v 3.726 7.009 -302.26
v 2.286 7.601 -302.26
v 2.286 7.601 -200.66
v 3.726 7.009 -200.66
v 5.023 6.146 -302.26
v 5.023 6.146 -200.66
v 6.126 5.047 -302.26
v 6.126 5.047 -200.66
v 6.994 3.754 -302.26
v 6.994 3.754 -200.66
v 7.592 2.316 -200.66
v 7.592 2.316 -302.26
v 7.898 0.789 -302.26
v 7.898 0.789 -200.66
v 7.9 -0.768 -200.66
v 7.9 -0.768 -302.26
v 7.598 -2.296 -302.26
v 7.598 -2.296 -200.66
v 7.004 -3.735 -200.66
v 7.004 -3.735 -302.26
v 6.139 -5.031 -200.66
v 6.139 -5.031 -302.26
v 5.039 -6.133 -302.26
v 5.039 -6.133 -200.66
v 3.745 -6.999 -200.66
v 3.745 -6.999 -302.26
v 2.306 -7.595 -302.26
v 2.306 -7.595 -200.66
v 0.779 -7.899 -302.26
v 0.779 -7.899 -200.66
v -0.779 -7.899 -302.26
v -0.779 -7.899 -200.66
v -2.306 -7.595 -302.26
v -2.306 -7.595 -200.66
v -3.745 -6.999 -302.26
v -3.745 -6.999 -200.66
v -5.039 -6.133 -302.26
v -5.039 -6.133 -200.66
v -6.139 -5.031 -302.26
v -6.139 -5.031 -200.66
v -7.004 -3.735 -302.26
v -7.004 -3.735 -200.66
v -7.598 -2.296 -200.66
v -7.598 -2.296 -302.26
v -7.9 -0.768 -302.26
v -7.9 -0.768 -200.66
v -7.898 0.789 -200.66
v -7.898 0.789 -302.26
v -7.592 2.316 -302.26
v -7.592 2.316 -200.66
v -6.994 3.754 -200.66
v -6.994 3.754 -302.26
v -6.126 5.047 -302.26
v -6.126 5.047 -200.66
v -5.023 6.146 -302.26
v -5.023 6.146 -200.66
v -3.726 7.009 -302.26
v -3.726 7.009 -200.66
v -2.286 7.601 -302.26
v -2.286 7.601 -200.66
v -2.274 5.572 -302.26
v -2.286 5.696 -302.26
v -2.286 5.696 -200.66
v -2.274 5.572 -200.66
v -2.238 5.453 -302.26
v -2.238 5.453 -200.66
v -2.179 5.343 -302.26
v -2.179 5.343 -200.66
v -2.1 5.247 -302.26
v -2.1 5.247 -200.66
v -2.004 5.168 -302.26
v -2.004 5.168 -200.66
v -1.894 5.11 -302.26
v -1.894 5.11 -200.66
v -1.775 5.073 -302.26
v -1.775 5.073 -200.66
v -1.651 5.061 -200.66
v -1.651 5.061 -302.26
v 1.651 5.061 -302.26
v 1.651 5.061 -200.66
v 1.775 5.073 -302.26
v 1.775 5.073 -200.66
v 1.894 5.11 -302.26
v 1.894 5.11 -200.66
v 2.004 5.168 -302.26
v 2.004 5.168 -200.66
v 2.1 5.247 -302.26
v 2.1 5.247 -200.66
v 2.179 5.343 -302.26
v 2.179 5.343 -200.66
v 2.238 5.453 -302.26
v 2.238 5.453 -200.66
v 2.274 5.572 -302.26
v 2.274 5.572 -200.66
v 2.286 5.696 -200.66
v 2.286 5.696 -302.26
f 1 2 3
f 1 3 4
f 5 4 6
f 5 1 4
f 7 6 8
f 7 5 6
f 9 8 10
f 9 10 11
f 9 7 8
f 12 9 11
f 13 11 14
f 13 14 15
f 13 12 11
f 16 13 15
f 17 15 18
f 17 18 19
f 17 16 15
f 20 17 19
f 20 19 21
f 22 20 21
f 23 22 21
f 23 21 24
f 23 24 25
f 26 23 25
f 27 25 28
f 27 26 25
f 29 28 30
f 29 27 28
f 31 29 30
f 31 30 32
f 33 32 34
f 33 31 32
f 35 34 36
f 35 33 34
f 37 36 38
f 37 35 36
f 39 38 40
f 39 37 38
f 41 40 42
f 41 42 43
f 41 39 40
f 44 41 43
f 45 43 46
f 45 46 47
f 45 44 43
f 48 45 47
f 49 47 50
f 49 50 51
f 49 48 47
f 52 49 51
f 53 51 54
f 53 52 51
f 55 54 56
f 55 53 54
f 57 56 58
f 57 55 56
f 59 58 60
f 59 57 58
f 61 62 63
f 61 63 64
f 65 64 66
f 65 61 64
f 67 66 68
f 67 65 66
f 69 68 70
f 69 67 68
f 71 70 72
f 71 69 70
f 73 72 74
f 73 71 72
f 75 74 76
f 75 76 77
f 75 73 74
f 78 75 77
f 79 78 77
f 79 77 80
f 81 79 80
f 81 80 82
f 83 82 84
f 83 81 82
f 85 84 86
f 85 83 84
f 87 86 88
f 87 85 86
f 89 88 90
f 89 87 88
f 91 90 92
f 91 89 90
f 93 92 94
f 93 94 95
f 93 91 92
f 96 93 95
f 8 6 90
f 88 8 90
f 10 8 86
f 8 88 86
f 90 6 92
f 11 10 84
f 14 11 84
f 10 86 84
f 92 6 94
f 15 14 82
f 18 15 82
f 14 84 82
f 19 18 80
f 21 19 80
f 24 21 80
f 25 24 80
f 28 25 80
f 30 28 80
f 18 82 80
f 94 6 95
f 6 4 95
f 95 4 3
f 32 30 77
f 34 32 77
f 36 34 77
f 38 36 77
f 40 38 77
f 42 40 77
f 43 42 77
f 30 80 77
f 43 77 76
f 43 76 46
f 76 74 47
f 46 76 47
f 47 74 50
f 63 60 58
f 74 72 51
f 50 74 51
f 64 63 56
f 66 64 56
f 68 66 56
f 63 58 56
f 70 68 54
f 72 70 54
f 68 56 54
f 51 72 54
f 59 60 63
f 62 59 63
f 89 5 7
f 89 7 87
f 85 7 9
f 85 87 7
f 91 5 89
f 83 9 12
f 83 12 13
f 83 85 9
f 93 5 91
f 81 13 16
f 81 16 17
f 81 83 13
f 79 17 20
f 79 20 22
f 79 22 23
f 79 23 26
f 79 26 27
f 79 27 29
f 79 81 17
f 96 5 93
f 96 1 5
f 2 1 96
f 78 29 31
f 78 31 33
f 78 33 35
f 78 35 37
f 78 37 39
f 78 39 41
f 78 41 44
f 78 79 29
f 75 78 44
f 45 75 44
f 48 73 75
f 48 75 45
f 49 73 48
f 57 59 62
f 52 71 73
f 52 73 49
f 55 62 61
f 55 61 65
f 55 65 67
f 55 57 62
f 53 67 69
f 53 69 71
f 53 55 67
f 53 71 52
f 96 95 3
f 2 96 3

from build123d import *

# Parameters (mm, degrees)
BOSS_EXTRUDE1_DEPTH = 101.6


with BuildPart() as part:
    # Sketch1 → Boss-Extrude1 (new body)
    with BuildSketch(Plane(origin=(0, 0, -302.26), x_dir=(-1, 0, 0), z_dir=(0, 0, -1))):
        with BuildLine():
            Line((2.286, 7.60119137), (2.286, 5.69619137))
            ThreePointArc((2.286, 5.69619137), (2.100012806, 5.247178564), (1.651, 5.06119137))
            Line((1.651, 5.06119137), (-1.651, 5.06119137))
            ThreePointArc((-1.651, 5.06119137), (-2.100012806, 5.247178564), (-2.286, 5.69619137))
            Line((-2.286, 5.69619137), (-2.286, 7.60119137))
            ThreePointArc((-2.286, 7.60119137), (0, -7.9375), (2.286, 7.60119137))
        make_face()
    extrude(amount=-BOSS_EXTRUDE1_DEPTH)


solid = part.part
